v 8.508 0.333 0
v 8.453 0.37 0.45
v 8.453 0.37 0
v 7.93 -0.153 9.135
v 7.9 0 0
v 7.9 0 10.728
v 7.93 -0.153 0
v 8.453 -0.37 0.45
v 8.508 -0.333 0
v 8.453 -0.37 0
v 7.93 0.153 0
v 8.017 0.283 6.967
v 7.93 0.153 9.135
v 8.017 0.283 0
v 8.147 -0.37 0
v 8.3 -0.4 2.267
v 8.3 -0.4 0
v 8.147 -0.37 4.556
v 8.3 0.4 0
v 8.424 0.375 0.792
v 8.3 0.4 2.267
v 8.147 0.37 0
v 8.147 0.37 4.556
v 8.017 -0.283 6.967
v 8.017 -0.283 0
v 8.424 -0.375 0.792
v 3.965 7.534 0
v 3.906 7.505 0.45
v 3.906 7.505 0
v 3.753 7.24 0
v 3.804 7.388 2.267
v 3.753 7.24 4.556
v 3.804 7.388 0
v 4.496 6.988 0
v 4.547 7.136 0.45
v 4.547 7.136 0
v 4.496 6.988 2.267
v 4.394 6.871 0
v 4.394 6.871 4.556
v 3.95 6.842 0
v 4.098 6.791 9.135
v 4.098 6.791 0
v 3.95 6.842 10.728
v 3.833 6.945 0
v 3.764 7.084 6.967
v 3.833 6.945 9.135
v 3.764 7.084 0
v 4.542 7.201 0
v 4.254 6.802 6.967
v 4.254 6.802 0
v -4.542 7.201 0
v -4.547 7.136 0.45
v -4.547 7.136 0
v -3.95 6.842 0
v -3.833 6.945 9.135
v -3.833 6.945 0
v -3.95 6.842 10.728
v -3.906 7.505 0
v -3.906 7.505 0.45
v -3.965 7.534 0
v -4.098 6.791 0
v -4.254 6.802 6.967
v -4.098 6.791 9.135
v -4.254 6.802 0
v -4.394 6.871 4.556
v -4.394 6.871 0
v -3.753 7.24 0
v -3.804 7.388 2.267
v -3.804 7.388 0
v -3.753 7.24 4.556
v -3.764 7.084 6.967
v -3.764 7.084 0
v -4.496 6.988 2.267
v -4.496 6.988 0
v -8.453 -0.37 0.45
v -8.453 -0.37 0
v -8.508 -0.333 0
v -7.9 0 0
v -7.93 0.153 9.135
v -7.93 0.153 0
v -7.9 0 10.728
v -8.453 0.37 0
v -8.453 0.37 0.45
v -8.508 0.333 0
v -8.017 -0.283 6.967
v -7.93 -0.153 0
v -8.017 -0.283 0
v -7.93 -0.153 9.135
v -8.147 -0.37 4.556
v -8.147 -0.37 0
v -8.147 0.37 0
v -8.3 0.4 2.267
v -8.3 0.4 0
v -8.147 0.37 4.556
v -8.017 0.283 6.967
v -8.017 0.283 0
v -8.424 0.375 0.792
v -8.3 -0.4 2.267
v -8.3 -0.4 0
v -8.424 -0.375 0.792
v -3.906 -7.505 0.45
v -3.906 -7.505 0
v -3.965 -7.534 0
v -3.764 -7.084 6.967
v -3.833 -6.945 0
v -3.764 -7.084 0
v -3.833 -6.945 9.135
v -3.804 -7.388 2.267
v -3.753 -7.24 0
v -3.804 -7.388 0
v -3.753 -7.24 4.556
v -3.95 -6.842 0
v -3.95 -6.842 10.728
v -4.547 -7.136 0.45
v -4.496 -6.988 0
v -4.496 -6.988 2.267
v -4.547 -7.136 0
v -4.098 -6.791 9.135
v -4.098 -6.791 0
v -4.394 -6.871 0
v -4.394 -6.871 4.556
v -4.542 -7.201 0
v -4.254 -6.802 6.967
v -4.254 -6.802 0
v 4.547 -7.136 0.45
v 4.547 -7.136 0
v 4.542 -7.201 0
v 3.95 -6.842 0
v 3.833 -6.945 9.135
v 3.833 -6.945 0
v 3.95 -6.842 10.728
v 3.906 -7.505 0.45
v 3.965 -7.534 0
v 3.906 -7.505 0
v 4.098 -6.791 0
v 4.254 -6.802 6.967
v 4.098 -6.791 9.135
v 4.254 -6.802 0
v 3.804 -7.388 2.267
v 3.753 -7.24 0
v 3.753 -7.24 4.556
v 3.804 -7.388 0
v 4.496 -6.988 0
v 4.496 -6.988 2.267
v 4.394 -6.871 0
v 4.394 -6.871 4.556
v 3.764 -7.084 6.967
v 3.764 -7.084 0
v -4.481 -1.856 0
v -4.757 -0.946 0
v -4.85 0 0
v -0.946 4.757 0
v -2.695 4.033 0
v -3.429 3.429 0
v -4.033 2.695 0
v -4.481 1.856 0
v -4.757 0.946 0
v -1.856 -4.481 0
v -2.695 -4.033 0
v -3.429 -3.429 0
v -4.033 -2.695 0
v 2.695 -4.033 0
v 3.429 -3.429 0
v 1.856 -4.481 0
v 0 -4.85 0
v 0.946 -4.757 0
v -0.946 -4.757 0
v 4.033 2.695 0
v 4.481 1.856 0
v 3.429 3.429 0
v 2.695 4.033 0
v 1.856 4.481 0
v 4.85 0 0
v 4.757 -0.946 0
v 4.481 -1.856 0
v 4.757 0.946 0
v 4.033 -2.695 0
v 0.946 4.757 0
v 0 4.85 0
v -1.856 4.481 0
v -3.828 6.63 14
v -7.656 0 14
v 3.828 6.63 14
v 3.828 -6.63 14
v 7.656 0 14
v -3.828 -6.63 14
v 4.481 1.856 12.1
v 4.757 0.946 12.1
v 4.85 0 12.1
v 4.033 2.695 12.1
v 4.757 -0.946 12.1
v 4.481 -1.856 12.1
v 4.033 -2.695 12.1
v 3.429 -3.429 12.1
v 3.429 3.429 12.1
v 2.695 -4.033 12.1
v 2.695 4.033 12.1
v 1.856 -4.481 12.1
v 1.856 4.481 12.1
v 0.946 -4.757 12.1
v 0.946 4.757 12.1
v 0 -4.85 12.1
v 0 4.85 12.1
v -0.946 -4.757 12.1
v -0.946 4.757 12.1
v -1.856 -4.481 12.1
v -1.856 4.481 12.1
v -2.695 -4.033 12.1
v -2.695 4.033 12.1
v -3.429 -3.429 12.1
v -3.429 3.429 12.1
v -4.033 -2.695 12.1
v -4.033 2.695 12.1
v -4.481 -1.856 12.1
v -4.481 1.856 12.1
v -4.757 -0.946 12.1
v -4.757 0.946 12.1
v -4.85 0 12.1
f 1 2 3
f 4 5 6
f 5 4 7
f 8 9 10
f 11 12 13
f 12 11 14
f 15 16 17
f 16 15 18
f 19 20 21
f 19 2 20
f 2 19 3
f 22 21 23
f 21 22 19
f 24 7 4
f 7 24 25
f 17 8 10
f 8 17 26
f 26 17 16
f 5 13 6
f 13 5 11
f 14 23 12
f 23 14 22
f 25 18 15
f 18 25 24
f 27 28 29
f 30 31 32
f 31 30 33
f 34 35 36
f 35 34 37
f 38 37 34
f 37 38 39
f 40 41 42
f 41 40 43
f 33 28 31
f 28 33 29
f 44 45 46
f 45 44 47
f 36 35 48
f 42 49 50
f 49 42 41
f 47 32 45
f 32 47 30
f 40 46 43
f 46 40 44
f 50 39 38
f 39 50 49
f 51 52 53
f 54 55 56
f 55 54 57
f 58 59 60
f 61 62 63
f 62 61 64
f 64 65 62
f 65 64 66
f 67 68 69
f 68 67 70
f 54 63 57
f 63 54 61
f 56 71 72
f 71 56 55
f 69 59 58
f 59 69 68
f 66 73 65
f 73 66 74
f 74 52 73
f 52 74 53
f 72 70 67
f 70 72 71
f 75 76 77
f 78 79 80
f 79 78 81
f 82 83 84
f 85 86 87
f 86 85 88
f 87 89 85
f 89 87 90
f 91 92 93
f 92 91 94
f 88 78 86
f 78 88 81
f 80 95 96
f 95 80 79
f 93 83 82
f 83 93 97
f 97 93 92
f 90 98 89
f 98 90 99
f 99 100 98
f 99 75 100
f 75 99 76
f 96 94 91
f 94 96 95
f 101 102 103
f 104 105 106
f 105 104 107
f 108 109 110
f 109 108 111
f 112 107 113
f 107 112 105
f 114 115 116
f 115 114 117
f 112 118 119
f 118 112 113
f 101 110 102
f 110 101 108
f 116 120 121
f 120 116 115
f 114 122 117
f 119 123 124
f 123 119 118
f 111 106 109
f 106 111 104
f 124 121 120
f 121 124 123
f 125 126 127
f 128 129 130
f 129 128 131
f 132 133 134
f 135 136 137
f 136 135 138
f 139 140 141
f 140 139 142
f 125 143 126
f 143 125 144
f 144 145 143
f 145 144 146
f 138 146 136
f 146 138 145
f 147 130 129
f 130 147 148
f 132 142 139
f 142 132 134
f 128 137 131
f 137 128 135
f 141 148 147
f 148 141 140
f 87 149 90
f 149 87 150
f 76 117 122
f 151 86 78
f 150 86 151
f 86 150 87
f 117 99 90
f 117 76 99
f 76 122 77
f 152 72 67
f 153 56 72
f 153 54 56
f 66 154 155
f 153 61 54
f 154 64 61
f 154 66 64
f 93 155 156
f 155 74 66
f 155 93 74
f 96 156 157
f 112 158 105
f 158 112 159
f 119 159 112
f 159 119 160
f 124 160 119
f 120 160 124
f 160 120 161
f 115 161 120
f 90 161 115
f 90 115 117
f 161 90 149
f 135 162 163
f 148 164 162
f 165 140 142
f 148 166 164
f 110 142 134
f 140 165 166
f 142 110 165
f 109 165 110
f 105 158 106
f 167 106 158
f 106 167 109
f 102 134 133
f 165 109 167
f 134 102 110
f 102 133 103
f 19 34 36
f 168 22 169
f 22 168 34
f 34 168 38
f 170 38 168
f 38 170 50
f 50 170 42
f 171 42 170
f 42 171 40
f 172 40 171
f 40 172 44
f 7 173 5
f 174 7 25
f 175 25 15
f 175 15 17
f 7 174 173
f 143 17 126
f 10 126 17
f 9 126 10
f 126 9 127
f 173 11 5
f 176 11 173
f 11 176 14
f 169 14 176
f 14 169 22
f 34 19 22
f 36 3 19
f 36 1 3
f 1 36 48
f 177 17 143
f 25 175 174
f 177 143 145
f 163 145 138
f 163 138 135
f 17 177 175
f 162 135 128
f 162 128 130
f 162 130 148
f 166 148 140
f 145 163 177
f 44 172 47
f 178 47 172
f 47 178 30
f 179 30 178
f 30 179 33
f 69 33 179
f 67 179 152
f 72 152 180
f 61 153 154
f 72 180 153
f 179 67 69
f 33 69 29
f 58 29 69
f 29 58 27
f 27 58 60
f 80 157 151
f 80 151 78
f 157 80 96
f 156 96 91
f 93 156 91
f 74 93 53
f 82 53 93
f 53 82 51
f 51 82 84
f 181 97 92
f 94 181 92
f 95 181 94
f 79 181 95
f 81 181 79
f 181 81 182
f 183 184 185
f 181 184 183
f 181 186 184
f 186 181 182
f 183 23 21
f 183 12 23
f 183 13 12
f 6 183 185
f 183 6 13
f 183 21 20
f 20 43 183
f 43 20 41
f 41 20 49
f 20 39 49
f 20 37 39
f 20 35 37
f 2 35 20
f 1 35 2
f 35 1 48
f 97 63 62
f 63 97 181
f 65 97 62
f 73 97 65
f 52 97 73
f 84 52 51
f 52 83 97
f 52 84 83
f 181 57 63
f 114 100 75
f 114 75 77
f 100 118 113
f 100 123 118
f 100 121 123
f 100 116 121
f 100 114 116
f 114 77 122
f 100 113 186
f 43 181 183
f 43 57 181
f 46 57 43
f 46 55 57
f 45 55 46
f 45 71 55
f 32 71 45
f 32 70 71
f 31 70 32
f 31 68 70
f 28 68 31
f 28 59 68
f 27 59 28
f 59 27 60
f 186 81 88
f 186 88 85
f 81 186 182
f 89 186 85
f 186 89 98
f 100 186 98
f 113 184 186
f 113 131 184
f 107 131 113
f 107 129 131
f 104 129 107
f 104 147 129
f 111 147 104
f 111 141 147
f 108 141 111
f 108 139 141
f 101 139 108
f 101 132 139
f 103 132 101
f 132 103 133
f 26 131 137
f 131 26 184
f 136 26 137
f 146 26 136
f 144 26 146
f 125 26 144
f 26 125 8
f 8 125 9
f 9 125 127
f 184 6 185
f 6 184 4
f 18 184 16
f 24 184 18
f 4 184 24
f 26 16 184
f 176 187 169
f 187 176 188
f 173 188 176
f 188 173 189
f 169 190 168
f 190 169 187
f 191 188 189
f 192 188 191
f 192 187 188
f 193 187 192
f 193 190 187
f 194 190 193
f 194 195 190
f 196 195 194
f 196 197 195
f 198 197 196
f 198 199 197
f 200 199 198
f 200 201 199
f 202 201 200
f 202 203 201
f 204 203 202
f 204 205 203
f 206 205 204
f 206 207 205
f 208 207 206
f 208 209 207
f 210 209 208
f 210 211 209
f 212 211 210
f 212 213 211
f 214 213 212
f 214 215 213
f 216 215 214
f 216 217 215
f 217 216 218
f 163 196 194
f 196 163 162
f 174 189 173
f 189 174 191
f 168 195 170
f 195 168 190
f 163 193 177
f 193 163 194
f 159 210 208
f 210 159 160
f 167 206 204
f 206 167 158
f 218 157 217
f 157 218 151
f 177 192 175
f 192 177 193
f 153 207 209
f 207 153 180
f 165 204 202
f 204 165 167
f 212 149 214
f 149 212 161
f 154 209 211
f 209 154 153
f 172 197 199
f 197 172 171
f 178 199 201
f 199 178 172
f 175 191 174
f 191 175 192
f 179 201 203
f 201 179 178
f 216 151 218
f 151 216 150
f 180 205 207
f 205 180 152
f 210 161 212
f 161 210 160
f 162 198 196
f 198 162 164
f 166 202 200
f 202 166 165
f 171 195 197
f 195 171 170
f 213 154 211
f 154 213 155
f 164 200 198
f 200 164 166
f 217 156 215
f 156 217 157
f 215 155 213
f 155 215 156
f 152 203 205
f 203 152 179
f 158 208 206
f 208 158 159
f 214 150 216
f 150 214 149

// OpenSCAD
// ACCESS KNOB — Intellijel Eurorack Micro Knob (Slip-On Sleeve)
// Generated via CLI for Studio Knobs (Slip-On Sleeve)
module access_knob_intellijel_micro_slipon() {
  outer_d = 17.4;
  height = 14;
  taper = 0.88;
  bore_d = 9.4;
  slot_h = 12;
  tex_depth = 0.8;
  tex_scale = 0.8;
  tex_count = 6;

  difference() {
    cylinder(h=height, d1=outer_d, d2=outer_d*taper, $fn=6);
    translate([0,0,-0.1]) cylinder(h=slot_h+0.2, d=bore_d + 0.3, $fn=32);
    for(i=[0:tex_count-1]) {
      rotate([0,0,i*(360/tex_count)])
        translate([outer_d/2-tex_depth/2, 0, height/2])
          cylinder(h=height*1.1, d=tex_scale, center=true, $fn=16);
    }
  }
}
access_knob_intellijel_micro_slipon();
